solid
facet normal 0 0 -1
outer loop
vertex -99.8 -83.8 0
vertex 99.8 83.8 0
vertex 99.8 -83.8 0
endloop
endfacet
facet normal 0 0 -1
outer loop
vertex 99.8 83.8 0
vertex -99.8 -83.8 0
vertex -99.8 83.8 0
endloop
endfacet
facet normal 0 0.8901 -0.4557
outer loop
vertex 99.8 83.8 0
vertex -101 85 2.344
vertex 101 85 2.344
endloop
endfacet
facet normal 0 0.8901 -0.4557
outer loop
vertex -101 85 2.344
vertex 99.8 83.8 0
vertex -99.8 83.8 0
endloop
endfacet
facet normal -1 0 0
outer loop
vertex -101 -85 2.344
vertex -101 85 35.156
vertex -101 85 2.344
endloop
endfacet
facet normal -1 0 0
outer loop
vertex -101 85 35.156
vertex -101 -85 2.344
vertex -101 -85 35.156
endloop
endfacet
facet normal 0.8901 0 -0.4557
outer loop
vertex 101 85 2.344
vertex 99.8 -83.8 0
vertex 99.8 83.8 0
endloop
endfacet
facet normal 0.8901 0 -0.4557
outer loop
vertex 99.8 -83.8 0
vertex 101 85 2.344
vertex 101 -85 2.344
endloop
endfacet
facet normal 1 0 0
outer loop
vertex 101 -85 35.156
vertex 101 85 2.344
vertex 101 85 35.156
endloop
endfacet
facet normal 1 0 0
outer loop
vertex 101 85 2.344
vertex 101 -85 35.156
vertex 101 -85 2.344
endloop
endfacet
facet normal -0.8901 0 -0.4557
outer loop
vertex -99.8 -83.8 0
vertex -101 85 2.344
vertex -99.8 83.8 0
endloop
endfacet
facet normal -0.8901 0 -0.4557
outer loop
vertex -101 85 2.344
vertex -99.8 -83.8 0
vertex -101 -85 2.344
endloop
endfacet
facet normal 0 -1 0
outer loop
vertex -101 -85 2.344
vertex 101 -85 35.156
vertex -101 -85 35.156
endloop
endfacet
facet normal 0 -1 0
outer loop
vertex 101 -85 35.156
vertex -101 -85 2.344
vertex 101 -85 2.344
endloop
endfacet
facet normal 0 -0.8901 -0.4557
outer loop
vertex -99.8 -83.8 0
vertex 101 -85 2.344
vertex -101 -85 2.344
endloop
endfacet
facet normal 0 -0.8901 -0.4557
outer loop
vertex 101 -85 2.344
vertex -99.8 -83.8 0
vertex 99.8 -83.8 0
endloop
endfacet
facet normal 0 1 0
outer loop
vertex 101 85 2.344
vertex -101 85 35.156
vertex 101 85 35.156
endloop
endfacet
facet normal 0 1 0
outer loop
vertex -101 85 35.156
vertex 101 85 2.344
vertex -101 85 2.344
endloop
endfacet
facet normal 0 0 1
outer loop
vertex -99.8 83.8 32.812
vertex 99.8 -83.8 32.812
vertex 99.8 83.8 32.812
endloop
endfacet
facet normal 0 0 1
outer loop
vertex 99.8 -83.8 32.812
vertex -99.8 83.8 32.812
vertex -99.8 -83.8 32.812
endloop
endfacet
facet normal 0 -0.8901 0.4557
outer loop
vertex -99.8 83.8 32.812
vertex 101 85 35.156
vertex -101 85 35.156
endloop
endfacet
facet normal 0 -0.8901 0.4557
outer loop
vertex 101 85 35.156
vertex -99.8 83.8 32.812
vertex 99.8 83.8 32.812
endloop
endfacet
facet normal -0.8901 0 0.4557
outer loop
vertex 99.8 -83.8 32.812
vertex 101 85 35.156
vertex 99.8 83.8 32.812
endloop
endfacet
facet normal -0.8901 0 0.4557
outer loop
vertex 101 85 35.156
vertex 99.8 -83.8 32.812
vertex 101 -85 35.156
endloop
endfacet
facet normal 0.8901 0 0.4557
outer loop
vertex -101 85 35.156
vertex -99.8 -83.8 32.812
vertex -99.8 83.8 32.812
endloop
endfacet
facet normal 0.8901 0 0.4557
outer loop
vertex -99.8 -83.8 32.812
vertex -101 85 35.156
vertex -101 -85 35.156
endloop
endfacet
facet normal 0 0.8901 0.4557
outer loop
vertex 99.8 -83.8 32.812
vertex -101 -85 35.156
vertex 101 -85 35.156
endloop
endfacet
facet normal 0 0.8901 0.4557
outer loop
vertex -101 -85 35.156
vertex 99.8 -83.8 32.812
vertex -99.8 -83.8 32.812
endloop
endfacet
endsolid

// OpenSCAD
// Crate "shelf" inserts
// 20.2x17 cm^2
shelf_len = 202.0;
shelf_wid = 170.0;
shelf_h = 150.0/4.0; // 150mm total height, 4 shelves total

wall_thick = 0.8;
spacing = wall_thick*2.0;


// Side wall without handle
module wall3D(wid) {
    translate([0,0,shelf_h/2.0])
    rotate([90,0,0])
    translate([0,0,-wall_thick/2.0])
    linear_extrude(wall_thick)
    square([wid, shelf_h], center=true);
}

module uncutBox3D() {
    union() {
        translate([0,shelf_wid/2-wall_thick/2.0,0])
        wall3D(shelf_len);
        translate([0,-shelf_wid/2+wall_thick/2.0,0])
        wall3D(shelf_len);
        
        rotate([0,0,90]) {
        translate([0,shelf_len/2-wall_thick/2.0,0])
        wall3D(shelf_wid);
        translate([0,-shelf_len/2+wall_thick/2.0,0])
        wall3D(shelf_wid);
        }
    }
}

module solidBoxTop3D() {
    translate([0,0,shelf_h/2.0])
    cube([shelf_len, shelf_wid, (shelf_h*7.0)/8.0], center=true);
}

diff = wall_thick+spacing;
module solidBoxBottom3D() {
    translate([0,0,shelf_h/(2*8.0)])
    cube([shelf_len-diff, shelf_wid-diff, shelf_h/8.0], center=true);
}

module solidBox3D() {
    union() {
        solidBoxTop3D();
        solidBoxBottom3D();
    }
}

module hulledSolidBox3D() {
    hull() {
    solidBox3D();
    solidBox3D();    
    }
    
}

difference() {
hulledSolidBox3D();
translate([0,0,shelf_h*(7.0/8.0)])
hulledSolidBox3D();
}
